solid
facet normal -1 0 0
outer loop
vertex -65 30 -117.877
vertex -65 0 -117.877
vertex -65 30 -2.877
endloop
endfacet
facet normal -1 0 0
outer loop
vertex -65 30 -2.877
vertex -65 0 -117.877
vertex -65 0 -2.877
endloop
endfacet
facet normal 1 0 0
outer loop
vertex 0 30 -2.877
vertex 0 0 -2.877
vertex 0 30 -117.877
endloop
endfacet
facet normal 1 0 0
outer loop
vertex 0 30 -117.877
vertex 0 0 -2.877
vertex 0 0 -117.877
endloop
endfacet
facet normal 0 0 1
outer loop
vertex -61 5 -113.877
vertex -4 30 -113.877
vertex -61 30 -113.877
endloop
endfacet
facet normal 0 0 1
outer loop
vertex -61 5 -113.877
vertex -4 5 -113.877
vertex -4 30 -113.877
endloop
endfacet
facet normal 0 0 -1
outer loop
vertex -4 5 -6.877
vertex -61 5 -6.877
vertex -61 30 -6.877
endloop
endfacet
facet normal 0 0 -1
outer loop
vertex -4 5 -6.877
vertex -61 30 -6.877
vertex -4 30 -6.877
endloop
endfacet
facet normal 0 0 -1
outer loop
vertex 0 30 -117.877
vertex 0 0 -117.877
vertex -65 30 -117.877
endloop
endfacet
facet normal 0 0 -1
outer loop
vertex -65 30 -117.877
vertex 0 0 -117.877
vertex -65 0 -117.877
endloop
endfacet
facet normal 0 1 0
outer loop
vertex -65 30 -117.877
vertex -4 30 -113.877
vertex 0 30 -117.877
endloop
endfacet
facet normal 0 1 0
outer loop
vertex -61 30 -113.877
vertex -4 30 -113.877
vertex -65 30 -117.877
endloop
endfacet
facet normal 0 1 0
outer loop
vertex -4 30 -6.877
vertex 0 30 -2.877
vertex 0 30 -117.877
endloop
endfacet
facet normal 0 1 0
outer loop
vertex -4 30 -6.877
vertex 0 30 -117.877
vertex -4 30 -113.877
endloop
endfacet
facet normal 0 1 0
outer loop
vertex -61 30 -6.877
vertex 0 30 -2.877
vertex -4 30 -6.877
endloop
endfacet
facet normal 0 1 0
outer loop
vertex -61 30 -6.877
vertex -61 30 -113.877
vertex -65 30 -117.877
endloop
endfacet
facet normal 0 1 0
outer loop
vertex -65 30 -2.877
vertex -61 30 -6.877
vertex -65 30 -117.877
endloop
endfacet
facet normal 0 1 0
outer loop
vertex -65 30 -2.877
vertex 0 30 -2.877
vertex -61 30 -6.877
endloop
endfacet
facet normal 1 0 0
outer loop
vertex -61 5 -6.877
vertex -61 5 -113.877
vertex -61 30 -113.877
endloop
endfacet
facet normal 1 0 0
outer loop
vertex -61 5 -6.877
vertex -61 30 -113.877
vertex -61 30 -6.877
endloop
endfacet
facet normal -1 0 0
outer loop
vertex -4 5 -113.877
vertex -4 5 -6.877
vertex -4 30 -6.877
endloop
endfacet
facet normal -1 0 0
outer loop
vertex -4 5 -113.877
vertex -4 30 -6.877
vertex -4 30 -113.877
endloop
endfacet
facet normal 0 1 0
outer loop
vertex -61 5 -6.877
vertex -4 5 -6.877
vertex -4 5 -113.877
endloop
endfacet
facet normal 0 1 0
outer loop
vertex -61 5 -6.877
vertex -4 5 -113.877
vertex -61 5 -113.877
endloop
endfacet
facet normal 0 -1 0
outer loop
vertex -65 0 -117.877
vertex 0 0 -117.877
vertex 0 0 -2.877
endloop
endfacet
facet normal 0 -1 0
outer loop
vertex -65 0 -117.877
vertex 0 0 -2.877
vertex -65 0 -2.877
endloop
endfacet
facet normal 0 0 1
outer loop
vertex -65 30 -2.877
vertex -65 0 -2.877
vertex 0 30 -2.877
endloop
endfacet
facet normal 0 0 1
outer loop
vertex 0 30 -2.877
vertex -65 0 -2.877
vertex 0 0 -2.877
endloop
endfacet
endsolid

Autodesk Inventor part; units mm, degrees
ref_plane "YZ Plane" through (0, 0, 0) normal (1, 0, 0) x (0, 1, 0)
ref_plane "XZ Plane" through (0, 0, 0) normal (0, 1, 0) x (-1, 0, 0)
ref_plane "XY Plane" through (0, 0, 0) normal (0, 0, 1) x (1, 0, 0)
sketch "스케치2" plane through (0, 0, 0) normal (0, 1, 0) x (-1, 0, 0)
  line L0 (65, -2.8774) -> (0, -2.8774)
  line L1 (0, -2.8774) -> (0, -117.8774)
  line L2 (0, -117.8774) -> (65, -117.8774)
  line L3 (65, -117.8774) -> (65, -2.8774)
  line L4 (61, -6.8774) -> (4, -6.8774)
  line L5 (4, -6.8774) -> (4, -113.8774)
  line L6 (4, -113.8774) -> (61, -113.8774)
  line L7 (61, -113.8774) -> (61, -6.8774)
  point P0 (0, 0)
  dimension "d0" = 65
  dimension "d1" = 115
  dimension "d2" = 4
extrude "돌출1" add sketch "스케치2" along normal blind 30
extrude "돌출2" add sketch "스케치2" along normal blind 5 contours L7 L6 L5 L4
properties part number "gps_case_2"
